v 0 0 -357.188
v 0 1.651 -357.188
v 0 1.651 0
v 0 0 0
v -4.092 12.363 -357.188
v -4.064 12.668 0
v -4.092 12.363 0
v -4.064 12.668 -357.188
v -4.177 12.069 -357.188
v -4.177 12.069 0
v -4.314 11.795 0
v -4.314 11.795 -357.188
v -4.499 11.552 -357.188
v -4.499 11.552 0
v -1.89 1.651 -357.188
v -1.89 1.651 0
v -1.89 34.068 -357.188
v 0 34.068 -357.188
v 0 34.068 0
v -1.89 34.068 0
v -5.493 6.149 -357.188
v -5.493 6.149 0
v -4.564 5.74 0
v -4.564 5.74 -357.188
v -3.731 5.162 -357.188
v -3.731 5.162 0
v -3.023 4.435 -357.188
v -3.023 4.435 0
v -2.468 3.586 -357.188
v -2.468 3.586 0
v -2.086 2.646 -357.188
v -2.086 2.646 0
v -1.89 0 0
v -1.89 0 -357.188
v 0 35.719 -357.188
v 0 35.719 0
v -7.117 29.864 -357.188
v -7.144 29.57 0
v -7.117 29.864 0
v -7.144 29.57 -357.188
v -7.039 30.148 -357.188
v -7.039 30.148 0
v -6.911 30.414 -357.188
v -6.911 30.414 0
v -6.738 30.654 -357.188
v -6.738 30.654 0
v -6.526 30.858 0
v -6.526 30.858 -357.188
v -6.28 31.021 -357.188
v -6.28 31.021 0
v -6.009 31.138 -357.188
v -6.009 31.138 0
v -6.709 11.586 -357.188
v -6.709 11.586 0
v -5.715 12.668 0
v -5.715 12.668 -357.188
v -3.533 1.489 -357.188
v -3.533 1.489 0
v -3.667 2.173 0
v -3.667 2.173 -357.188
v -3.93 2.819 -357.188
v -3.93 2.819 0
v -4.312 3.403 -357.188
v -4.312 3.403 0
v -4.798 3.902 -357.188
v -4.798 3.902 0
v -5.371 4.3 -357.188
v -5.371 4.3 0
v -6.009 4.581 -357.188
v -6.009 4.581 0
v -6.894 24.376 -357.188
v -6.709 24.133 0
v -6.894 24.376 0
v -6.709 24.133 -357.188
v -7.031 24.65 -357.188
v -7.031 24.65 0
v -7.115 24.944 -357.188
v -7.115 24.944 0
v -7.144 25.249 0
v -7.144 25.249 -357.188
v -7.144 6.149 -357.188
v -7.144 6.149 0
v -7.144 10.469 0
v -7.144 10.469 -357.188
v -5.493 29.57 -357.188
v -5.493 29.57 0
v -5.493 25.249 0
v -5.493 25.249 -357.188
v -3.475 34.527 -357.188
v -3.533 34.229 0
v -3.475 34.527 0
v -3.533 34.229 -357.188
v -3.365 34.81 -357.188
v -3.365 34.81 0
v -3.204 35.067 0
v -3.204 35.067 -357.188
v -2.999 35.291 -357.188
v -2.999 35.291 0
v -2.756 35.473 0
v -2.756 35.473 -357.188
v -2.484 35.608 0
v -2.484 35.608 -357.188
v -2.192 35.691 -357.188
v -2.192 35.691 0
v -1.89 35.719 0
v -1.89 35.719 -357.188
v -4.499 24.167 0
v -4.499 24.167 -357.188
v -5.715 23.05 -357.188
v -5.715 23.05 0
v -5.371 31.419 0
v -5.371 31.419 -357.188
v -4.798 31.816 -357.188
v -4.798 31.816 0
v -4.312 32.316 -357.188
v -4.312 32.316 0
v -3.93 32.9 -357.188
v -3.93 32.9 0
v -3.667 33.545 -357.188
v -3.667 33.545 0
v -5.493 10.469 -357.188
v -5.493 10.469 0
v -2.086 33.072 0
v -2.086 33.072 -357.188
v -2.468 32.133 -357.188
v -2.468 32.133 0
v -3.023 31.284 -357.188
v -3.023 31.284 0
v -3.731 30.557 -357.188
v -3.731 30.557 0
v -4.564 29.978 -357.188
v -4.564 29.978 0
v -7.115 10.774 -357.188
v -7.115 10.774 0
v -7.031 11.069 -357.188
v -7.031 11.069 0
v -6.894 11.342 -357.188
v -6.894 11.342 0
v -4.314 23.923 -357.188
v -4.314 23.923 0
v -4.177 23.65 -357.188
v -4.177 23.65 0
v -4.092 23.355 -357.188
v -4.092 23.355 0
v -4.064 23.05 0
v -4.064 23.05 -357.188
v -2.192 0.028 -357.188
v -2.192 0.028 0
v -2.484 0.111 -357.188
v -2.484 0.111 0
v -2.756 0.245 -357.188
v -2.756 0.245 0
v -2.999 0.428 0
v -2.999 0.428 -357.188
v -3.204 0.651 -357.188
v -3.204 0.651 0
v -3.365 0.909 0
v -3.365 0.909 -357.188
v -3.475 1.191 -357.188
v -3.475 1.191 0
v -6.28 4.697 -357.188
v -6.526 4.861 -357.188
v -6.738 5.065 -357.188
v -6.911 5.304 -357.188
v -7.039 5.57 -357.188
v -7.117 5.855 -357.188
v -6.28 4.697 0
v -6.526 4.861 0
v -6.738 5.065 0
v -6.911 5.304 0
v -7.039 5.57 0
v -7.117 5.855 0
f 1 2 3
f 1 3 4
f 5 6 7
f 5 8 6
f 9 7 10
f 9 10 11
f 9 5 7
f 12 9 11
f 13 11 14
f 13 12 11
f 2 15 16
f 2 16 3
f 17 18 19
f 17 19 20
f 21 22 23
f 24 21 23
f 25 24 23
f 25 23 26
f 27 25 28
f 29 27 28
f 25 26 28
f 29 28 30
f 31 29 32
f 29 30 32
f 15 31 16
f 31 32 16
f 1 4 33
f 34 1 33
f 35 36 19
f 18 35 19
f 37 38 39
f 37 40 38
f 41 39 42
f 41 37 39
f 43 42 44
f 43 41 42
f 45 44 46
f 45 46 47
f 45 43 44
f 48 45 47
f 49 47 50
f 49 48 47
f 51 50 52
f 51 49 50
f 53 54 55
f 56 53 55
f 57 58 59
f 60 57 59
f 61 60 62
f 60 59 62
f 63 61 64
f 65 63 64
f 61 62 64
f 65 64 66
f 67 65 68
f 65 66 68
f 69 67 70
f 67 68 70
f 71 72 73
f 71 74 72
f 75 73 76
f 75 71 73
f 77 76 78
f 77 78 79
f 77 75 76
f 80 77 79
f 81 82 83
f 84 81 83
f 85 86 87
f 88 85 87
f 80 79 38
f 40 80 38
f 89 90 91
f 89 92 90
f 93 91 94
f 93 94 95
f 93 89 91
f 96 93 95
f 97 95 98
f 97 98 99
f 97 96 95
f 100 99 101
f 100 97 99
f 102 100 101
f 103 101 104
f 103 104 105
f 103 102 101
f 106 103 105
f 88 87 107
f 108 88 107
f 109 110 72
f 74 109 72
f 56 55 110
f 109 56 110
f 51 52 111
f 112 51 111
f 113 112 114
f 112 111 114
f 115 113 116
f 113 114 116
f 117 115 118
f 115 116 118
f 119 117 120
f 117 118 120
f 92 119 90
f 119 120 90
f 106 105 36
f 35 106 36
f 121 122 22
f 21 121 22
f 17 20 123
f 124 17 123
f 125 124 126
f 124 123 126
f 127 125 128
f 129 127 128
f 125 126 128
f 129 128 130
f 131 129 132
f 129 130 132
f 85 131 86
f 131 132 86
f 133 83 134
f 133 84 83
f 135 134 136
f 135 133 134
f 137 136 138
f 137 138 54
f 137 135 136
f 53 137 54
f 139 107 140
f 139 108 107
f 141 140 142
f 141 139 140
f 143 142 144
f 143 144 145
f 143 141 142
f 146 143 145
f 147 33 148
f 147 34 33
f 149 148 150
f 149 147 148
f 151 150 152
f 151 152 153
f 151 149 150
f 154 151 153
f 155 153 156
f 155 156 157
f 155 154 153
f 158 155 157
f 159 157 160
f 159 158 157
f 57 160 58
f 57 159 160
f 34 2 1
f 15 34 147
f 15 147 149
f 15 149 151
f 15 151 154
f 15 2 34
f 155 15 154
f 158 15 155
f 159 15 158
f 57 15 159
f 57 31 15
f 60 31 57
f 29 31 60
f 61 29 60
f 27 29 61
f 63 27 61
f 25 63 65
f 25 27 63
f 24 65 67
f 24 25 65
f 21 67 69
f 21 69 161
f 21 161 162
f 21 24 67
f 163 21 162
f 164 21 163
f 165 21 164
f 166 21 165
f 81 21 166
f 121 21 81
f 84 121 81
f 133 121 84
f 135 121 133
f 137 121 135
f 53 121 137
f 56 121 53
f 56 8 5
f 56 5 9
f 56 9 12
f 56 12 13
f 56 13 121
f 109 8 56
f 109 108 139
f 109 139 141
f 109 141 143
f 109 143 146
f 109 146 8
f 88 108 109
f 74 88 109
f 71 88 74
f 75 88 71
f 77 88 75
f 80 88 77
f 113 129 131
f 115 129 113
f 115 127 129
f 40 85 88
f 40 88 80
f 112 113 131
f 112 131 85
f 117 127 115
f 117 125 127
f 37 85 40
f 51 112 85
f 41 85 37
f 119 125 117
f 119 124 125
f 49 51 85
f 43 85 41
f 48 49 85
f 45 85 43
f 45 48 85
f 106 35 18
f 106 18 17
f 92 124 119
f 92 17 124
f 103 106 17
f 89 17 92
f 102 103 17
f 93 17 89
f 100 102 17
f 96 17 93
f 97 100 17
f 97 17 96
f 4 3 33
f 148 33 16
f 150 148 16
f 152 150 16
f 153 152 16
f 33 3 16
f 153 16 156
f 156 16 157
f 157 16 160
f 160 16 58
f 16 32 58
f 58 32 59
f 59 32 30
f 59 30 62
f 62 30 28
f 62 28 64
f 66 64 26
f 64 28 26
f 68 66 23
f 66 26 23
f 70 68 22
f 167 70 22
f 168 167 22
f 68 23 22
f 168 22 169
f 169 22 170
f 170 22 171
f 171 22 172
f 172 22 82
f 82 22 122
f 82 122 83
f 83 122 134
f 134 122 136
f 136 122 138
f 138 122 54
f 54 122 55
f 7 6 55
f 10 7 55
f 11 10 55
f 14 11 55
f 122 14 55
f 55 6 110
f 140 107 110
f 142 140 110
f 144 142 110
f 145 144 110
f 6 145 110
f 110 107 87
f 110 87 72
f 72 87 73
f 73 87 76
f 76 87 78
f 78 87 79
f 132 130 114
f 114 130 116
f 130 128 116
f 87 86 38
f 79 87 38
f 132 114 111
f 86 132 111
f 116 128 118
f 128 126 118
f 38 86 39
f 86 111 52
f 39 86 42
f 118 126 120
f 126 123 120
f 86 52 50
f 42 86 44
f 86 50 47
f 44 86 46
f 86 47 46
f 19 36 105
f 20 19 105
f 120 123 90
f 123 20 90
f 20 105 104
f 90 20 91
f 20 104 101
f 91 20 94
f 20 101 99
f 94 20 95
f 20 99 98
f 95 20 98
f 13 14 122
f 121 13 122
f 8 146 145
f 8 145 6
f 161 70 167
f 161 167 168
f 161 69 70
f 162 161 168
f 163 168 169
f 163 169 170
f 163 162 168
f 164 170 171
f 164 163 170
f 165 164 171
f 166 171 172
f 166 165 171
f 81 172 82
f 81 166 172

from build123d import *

# Parameters (mm, degrees)
EXTRUDE_THIN1_DEPTH = 357.1875
FILLET1_R           = 1.651


with BuildPart() as part:
    # Sketch1 → Extrude-Thin1 (new body)
    with BuildSketch(Plane.XY):
        with BuildLine():
            Line((0, 0), (-3.697192387, 0))
            ThreePointArc((-3.697192387, 0), (-4.204355265, 3.261336848), (-7.14375, 4.7625))
            Line((-7.14375, 4.7625), (-7.14375, 11.1125))
            Line((-7.14375, 11.1125), (-5.715, 12.668334975))
            Line((-5.715, 12.668334975), (-5.715, 23.050415025))
            Line((-5.715, 23.050415025), (-7.14375, 24.60625))
            Line((-7.14375, 24.60625), (-7.14375, 30.95625))
            ThreePointArc((-7.14375, 30.95625), (-4.204355265, 32.457413152), (-3.697192387, 35.71875))
            Line((-3.697192387, 35.71875), (0, 35.71875))
            Line((0, 35.71875), (0, 34.06775))
            Line((0, 34.06775), (-1.889748251, 34.06775))
            ThreePointArc((-1.889748251, 34.06775), (-3.02342288, 31.283918913), (-5.49275, 29.570046904))
            Line((-5.49275, 29.570046904), (-5.49275, 25.249313927))
            Line((-5.49275, 25.249313927), (-4.064, 23.693478952))
            Line((-4.064, 23.693478952), (-4.064, 12.025271048))
            Line((-4.064, 12.025271048), (-5.49275, 10.469436073))
            Line((-5.49275, 10.469436073), (-5.49275, 6.148703096))
            ThreePointArc((-5.49275, 6.148703096), (-3.02342288, 4.434831087), (-1.889748251, 1.651))
            Line((-1.889748251, 1.651), (0, 1.651))
            Line((0, 1.651), (0, 0))
        make_face()
    extrude(amount=-EXTRUDE_THIN1_DEPTH)

    # Fillet1
    fillet1_edges = [part.edges().sort_by_distance(p)[0] for p in [
        (-3.697192387, 0, -178.59375),
        (-7.14375, 4.7625, -178.59375),
        (-7.14375, 11.1125, -178.59375),
        (-7.14375, 24.60625, -178.59375),
        (-7.14375, 30.95625, -178.59375),
        (-3.697192387, 35.71875, -178.59375),
        (-4.064, 23.693478952, -178.59375),
        (-4.064, 12.025271048, -178.59375),
    ]]
    fillet(fillet1_edges, radius=FILLET1_R)


solid = part.part
